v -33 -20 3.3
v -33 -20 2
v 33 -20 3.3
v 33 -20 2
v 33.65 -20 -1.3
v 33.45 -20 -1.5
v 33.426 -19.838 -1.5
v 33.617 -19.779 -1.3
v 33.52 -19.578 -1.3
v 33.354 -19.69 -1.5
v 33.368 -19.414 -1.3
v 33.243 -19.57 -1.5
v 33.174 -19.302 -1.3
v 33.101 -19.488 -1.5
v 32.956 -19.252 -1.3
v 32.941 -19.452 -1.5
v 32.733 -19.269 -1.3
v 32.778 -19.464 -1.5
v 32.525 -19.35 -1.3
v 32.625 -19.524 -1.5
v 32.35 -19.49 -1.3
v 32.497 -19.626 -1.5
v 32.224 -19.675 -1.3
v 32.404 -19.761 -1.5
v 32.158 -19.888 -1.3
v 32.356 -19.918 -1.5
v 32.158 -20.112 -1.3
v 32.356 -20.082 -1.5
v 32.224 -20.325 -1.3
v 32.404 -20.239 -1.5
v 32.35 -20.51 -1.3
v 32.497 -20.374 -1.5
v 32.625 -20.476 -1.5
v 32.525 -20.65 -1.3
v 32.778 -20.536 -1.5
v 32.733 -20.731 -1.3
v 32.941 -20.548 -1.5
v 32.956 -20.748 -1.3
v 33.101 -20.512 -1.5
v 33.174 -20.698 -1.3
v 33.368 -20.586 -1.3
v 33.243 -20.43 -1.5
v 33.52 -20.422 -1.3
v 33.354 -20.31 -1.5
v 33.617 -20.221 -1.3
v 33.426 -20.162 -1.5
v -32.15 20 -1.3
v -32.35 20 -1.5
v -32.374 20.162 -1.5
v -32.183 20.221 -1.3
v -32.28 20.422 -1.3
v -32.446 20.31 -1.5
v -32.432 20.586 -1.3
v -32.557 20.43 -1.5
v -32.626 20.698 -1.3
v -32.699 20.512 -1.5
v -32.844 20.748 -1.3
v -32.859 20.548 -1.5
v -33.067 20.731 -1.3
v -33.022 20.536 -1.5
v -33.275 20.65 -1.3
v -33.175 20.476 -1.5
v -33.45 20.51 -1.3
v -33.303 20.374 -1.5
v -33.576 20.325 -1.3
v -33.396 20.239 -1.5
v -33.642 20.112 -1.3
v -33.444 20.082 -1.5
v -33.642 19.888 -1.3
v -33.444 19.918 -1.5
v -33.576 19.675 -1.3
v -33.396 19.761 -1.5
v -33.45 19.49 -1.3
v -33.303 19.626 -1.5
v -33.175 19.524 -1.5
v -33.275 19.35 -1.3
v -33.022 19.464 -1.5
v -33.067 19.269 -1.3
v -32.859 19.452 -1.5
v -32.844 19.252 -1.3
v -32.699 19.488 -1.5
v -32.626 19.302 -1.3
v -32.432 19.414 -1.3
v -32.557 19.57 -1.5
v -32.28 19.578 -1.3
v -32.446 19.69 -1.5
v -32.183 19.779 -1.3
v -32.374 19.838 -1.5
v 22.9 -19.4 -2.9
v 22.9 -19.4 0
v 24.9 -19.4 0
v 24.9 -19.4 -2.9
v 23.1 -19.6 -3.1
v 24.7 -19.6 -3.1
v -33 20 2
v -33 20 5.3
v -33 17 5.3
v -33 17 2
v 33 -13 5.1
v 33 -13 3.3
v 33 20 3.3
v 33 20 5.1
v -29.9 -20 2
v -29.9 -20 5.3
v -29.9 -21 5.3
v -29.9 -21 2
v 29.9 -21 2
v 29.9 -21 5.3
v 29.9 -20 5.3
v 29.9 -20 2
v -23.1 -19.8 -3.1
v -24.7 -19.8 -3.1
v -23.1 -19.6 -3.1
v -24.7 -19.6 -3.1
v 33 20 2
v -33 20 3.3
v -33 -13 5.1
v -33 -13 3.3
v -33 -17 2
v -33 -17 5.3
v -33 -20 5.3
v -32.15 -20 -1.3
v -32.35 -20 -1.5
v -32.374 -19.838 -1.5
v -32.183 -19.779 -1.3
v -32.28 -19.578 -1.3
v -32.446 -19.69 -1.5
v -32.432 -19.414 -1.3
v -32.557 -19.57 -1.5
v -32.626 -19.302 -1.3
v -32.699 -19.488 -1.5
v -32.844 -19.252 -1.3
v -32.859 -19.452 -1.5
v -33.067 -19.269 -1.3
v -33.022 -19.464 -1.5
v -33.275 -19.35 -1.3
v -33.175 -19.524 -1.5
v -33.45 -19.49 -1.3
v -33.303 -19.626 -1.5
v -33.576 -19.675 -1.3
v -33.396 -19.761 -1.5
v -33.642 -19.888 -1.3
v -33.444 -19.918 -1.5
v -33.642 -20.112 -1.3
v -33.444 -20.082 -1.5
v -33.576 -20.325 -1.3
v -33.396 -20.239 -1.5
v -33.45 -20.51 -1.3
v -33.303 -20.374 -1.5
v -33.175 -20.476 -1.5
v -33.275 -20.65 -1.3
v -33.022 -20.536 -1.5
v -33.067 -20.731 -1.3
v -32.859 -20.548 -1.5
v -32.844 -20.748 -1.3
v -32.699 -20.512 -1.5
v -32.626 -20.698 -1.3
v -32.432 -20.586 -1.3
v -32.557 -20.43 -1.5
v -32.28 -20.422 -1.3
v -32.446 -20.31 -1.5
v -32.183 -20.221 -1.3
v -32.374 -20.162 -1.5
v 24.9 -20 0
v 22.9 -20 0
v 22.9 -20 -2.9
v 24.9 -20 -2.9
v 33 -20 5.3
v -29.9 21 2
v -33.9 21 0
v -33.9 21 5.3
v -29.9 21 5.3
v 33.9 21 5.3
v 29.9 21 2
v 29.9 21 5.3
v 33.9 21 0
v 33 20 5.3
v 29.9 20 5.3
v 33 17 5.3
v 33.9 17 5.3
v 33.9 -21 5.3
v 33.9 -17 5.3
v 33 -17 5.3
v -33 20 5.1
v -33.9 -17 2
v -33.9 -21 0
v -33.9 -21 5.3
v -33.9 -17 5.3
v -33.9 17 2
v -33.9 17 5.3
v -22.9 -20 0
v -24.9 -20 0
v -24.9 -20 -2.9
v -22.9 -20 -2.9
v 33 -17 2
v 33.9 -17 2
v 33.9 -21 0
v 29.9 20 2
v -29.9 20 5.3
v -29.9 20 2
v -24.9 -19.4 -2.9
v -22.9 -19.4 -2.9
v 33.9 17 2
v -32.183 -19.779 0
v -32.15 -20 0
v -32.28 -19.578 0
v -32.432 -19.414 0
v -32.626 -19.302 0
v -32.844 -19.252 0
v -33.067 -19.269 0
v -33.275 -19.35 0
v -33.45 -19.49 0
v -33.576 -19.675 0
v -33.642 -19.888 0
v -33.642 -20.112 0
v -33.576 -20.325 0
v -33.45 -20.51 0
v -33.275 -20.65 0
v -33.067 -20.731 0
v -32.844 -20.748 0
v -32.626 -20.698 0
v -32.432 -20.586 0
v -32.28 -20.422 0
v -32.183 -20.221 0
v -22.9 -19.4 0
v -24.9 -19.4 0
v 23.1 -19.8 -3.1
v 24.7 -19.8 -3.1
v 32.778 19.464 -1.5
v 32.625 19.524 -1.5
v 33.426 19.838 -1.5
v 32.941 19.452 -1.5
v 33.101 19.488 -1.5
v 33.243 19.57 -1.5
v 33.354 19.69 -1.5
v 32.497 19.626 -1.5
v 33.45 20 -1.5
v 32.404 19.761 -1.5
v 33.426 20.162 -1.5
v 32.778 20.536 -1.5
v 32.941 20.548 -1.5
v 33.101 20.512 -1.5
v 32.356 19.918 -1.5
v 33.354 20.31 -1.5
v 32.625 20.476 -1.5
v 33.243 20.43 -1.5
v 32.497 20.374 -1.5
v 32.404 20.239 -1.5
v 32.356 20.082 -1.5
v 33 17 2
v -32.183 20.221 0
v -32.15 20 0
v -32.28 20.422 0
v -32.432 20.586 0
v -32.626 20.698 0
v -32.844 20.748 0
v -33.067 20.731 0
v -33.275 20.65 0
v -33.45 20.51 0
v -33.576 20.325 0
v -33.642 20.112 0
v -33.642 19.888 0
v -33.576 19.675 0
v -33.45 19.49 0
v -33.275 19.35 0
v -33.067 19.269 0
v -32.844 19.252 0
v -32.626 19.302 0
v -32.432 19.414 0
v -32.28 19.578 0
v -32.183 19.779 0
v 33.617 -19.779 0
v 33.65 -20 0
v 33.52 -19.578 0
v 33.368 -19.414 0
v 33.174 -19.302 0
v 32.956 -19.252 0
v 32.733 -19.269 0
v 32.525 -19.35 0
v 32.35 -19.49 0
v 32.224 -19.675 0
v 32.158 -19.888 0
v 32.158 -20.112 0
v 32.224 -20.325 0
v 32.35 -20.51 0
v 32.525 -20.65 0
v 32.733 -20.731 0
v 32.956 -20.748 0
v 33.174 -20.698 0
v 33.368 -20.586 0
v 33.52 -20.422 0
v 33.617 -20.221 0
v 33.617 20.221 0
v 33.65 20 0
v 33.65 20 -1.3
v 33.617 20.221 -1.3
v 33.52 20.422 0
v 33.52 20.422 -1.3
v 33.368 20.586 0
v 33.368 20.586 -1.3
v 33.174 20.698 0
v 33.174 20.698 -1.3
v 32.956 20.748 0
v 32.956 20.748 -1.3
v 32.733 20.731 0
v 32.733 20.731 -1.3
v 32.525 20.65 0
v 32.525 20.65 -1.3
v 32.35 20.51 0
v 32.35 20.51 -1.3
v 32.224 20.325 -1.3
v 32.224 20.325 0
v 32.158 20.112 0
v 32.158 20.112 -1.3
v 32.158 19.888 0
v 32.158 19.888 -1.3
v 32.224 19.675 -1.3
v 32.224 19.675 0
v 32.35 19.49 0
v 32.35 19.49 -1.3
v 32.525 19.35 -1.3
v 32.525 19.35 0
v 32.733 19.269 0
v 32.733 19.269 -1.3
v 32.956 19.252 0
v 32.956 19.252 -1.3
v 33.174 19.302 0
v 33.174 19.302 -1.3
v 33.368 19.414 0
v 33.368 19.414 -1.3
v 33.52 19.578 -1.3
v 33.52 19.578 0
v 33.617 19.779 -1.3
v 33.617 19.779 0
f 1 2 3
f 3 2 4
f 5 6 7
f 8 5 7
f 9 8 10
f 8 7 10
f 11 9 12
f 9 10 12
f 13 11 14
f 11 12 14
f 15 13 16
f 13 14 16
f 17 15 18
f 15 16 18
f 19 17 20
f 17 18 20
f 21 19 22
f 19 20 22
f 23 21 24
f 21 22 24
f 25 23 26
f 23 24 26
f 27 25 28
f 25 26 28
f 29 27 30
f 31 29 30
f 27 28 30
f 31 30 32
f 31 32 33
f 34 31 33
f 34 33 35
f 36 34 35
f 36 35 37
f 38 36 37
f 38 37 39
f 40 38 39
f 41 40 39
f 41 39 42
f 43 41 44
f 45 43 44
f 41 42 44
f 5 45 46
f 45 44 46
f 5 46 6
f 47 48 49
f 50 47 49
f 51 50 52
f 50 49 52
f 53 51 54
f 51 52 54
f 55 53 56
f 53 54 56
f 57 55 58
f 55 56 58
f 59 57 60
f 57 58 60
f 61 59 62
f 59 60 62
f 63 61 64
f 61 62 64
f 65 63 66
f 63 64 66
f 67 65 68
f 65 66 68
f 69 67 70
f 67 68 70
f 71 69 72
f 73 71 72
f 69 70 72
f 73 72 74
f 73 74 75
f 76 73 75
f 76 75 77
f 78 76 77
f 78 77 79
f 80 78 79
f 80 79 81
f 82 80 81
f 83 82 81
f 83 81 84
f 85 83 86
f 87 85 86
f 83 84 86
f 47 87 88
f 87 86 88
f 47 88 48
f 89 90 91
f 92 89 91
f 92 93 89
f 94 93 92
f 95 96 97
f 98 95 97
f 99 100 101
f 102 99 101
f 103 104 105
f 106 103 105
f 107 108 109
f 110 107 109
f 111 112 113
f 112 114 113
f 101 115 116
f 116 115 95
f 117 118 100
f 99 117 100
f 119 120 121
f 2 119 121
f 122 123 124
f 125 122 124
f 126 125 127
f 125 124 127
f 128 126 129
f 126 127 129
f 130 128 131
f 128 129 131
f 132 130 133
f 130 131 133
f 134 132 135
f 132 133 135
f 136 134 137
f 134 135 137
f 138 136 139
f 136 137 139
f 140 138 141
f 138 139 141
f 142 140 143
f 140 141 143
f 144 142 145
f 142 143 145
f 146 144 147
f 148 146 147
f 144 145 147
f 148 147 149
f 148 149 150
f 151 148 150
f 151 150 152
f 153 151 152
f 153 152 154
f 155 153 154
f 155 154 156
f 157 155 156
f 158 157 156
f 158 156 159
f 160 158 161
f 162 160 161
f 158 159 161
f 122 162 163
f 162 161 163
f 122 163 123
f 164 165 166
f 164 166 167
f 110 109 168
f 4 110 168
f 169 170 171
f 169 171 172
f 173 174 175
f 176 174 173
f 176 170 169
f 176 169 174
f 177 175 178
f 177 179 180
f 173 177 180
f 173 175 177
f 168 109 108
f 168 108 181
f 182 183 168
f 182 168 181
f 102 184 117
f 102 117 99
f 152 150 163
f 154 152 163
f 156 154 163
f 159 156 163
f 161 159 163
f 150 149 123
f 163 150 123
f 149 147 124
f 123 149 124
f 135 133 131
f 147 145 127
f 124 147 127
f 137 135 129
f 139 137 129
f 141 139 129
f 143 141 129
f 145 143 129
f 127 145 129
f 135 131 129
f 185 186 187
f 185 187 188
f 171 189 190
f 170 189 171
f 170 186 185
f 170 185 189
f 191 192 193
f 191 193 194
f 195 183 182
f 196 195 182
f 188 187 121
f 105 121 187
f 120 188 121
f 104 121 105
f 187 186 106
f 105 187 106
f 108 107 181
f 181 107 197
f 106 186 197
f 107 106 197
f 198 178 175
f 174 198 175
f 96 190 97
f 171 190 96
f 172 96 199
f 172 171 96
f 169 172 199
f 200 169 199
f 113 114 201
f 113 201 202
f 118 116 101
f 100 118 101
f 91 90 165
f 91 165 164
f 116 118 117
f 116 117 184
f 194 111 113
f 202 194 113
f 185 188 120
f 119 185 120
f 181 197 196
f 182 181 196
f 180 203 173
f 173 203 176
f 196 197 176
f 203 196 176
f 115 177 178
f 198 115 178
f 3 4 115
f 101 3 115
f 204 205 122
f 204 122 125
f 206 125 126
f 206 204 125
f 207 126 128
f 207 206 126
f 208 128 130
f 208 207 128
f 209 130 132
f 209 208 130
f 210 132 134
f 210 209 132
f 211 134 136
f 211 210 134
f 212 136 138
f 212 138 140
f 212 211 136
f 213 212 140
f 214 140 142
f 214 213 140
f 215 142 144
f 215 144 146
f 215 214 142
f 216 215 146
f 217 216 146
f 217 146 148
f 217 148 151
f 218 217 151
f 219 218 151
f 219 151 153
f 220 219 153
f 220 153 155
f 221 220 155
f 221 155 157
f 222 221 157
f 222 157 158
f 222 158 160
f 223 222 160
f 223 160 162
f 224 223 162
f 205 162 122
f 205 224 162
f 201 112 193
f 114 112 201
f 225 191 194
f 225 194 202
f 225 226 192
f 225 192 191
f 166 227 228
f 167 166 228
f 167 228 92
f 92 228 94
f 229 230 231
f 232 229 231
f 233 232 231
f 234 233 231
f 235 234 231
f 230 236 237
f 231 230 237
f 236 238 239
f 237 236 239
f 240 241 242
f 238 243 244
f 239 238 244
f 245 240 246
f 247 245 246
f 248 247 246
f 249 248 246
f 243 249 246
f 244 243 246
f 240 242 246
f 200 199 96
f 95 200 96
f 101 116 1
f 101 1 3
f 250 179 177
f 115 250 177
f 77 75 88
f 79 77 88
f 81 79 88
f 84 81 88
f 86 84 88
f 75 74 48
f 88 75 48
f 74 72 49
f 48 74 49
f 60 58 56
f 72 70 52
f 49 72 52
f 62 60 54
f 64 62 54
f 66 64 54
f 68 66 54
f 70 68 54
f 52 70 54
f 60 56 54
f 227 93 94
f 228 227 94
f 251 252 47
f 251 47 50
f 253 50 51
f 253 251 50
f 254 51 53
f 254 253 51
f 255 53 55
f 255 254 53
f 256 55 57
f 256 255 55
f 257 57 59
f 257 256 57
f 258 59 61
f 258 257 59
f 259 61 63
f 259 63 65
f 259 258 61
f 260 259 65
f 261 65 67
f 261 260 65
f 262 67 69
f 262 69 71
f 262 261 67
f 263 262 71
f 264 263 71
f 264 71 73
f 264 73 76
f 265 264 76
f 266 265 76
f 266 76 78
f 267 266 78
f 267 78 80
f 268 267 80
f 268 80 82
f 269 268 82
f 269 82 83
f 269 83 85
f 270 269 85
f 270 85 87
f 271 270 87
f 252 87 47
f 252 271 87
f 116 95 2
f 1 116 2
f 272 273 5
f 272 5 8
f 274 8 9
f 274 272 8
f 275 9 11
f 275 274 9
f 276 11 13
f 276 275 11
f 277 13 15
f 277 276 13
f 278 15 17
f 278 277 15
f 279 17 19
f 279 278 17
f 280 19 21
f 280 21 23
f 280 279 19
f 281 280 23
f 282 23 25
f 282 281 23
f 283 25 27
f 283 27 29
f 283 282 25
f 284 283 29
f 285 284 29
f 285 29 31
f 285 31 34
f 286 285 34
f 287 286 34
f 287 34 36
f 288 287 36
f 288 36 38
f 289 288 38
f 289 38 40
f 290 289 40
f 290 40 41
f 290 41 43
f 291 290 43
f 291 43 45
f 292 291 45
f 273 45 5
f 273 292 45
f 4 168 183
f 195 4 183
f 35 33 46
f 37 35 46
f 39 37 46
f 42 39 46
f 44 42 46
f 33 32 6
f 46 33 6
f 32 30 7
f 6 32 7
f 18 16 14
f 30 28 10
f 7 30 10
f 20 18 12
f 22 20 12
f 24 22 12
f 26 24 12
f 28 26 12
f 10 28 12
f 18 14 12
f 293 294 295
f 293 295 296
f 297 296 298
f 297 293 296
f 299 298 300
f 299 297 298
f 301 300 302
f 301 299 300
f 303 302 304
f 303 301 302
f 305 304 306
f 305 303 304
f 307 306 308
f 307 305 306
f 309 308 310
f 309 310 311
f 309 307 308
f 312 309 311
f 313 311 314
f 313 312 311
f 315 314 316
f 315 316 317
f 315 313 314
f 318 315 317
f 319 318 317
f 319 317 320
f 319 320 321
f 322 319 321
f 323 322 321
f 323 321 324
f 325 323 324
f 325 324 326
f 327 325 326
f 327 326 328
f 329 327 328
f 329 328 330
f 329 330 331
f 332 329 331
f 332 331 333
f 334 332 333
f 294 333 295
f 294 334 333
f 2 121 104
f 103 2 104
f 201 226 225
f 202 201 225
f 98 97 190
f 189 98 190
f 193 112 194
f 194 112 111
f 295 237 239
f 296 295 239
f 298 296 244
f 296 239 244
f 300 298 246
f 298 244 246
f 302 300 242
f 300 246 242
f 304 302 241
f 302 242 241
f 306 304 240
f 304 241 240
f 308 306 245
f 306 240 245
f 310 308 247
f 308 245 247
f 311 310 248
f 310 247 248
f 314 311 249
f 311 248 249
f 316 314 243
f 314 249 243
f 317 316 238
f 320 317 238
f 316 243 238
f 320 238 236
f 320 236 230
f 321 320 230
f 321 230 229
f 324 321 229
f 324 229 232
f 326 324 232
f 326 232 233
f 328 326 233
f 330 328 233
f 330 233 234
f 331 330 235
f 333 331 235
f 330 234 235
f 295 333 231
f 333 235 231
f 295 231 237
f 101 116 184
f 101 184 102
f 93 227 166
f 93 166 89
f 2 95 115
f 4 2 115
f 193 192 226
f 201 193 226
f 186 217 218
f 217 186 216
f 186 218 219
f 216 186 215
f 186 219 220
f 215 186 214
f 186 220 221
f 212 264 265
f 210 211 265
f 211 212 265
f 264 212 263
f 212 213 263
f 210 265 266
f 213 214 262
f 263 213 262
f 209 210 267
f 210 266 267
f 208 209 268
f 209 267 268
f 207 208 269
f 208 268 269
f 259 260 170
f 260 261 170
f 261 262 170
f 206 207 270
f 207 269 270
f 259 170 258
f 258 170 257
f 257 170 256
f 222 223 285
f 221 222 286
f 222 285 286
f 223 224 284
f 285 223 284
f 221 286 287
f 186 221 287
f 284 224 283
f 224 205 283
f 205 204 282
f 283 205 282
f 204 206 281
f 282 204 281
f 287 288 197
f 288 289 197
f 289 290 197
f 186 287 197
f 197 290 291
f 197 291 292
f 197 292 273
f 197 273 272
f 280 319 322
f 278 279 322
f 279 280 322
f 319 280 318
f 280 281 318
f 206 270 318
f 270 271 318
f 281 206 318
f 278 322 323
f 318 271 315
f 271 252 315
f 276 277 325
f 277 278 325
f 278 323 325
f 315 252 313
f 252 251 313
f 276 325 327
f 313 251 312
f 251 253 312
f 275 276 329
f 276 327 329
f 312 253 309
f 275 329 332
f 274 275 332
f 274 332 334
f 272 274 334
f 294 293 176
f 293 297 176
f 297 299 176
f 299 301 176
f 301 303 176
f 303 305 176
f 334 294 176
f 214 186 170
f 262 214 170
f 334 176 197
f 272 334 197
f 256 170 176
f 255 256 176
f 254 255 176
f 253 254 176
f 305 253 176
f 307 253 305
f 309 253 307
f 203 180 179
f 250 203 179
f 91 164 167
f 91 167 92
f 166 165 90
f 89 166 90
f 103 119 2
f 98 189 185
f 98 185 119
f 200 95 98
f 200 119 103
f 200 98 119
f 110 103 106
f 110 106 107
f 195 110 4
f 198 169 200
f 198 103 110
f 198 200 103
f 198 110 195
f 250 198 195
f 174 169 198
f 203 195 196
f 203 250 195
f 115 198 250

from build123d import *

# Parameters (mm, degrees)
F0_W       = 67.8
F0_H       = 42
F0_R       = 0.75
F0_W_2     = 2
F0_H_2     = 0.6
F1_DEPTH   = 5.3
F2_DEPTH   = 1.5
F3_DEPTH   = 3.1
F5_DEPTH   = 3.3
F7_DEPTH   = 1.3
F8_W       = 66
F8_H       = 33
F9_DEPTH   = 1.8
F10_SIZE   = 0.2
F10_2_SIZE = 0.2
F10_3_SIZE = 0.2


with BuildPart() as f1:
    # F0 (on Top) → F1 (new body)
    with BuildSketch(Plane.XY):
        Rectangle(F0_W, F0_H)
        with Locations((-32.9, -20)):
            Circle(F0_R, mode=Mode.SUBTRACT)
        with Locations((-23.9, -19.7)):
            Rectangle(F0_W_2, F0_H_2, mode=Mode.SUBTRACT)
        with Locations((23.9, -19.7)):
            Rectangle(F0_W_2, F0_H_2, mode=Mode.SUBTRACT)
        with Locations((32.9, -20)):
            Circle(F0_R, mode=Mode.SUBTRACT)
        with Locations((-32.9, 20)):
            Circle(F0_R, mode=Mode.SUBTRACT)
        with Locations((32.9, 20)):
            Circle(F0_R, mode=Mode.SUBTRACT)
        with Locations((32.9, 20)):
            Circle(F0_R)
        with Locations((32.9, -20)):
            Circle(F0_R)
        with Locations((-32.9, 20)):
            Circle(F0_R)
        with Locations((-32.9, -20)):
            Circle(F0_R)
        with Locations((-23.9, -19.7)):
            Rectangle(F0_W_2, F0_H_2)
        with Locations((23.9, -19.7)):
            Rectangle(F0_W_2, F0_H_2)
    extrude(amount=F1_DEPTH)

    # F0 (on Top) → F2 (join)
    with BuildSketch(Plane.XY):
        with Locations((-32.9, -20)):
            Circle(F0_R)
        with Locations((32.9, -20)):
            Circle(F0_R)
        with Locations((32.9, 20)):
            Circle(F0_R)
        with Locations((-32.9, 20)):
            Circle(F0_R)
    extrude(amount=-F2_DEPTH)

    # F4 (on face) → F5 (cut)
    with BuildSketch(Plane.XY.offset(5.3)):
        Polygon((33, 17), (33, 20), (29.9, 20), (29.9, 21), (-29.9, 21), (-29.9, 20), (-33, 20), (-33, 17), (-33.9, 17), (-33.9, -17), (-33, -17), (-33, -20), (-29.9, -20), (-29.9, -21), (29.9, -21), (29.9, -20), (33, -20), (33, -17), (33.9, -17), (33.9, 17), align=None)
    extrude(amount=-F5_DEPTH, mode=Mode.SUBTRACT)

    # F10
    f10_edges = [f1.edges().sort_by_distance(p)[0] for p in [
        (-33.65, -20, -1.5),
        (32.15, -20, -1.5),
        (32.15, 20, -1.5),
        (-33.65, 20, -1.5),
    ]]
    chamfer(f10_edges, length=F10_SIZE)


with BuildPart() as f3:
    # F0 (on Top) → F3 (new body)
    with BuildSketch(Plane.XY):
        with Locations((-23.9, -19.7)):
            Rectangle(F0_W_2, F0_H_2)
    extrude(amount=-F3_DEPTH)

    # F10#2
    f10_2_edges = [f3.edges().sort_by_distance(p)[0] for p in [
        (-23.9, -20, -3.1),
        (-22.9, -19.7, -3.1),
        (-23.9, -19.4, -3.1),
        (-24.9, -19.7, -3.1),
    ]]
    chamfer(f10_2_edges, length=F10_2_SIZE)


with BuildPart() as f3b:
    # F0 (on Top) → F3, piece 2 (new body)
    with BuildSketch(Plane.XY):
        with Locations((23.9, -19.7)):
            Rectangle(F0_W_2, F0_H_2)
    extrude(amount=-F3_DEPTH)

    # F10#3
    f10_3_edges = [f3b.edges().sort_by_distance(p)[0] for p in [
        (23.9, -19.4, -3.1),
        (22.9, -19.7, -3.1),
        (23.9, -20, -3.1),
        (24.9, -19.7, -3.1),
    ]]
    chamfer(f10_3_edges, length=F10_3_SIZE)


with BuildPart() as f7:
    # F6 (on face) → F7 (new body)
    with BuildSketch(Plane.XY.offset(2)):
        Polygon((33, 17), (33, 20), (29.9, 20), (-29.9, 20), (-33, 20), (-33, 17), (-33, -17), (-33, -20), (-29.9, -20), (29.9, -20), (33, -20), (33, -17), align=None)
    extrude(amount=F7_DEPTH)


with BuildPart() as f9:
    # F8 (on face) → F9 (new body)
    with BuildSketch(Plane.XY.offset(3.3)):
        with Locations((0, 3.5)):
            Rectangle(F8_W, F8_H)
    extrude(amount=F9_DEPTH)


solid = Compound([f1.part, f3.part, f3b.part, f7.part, f9.part])
